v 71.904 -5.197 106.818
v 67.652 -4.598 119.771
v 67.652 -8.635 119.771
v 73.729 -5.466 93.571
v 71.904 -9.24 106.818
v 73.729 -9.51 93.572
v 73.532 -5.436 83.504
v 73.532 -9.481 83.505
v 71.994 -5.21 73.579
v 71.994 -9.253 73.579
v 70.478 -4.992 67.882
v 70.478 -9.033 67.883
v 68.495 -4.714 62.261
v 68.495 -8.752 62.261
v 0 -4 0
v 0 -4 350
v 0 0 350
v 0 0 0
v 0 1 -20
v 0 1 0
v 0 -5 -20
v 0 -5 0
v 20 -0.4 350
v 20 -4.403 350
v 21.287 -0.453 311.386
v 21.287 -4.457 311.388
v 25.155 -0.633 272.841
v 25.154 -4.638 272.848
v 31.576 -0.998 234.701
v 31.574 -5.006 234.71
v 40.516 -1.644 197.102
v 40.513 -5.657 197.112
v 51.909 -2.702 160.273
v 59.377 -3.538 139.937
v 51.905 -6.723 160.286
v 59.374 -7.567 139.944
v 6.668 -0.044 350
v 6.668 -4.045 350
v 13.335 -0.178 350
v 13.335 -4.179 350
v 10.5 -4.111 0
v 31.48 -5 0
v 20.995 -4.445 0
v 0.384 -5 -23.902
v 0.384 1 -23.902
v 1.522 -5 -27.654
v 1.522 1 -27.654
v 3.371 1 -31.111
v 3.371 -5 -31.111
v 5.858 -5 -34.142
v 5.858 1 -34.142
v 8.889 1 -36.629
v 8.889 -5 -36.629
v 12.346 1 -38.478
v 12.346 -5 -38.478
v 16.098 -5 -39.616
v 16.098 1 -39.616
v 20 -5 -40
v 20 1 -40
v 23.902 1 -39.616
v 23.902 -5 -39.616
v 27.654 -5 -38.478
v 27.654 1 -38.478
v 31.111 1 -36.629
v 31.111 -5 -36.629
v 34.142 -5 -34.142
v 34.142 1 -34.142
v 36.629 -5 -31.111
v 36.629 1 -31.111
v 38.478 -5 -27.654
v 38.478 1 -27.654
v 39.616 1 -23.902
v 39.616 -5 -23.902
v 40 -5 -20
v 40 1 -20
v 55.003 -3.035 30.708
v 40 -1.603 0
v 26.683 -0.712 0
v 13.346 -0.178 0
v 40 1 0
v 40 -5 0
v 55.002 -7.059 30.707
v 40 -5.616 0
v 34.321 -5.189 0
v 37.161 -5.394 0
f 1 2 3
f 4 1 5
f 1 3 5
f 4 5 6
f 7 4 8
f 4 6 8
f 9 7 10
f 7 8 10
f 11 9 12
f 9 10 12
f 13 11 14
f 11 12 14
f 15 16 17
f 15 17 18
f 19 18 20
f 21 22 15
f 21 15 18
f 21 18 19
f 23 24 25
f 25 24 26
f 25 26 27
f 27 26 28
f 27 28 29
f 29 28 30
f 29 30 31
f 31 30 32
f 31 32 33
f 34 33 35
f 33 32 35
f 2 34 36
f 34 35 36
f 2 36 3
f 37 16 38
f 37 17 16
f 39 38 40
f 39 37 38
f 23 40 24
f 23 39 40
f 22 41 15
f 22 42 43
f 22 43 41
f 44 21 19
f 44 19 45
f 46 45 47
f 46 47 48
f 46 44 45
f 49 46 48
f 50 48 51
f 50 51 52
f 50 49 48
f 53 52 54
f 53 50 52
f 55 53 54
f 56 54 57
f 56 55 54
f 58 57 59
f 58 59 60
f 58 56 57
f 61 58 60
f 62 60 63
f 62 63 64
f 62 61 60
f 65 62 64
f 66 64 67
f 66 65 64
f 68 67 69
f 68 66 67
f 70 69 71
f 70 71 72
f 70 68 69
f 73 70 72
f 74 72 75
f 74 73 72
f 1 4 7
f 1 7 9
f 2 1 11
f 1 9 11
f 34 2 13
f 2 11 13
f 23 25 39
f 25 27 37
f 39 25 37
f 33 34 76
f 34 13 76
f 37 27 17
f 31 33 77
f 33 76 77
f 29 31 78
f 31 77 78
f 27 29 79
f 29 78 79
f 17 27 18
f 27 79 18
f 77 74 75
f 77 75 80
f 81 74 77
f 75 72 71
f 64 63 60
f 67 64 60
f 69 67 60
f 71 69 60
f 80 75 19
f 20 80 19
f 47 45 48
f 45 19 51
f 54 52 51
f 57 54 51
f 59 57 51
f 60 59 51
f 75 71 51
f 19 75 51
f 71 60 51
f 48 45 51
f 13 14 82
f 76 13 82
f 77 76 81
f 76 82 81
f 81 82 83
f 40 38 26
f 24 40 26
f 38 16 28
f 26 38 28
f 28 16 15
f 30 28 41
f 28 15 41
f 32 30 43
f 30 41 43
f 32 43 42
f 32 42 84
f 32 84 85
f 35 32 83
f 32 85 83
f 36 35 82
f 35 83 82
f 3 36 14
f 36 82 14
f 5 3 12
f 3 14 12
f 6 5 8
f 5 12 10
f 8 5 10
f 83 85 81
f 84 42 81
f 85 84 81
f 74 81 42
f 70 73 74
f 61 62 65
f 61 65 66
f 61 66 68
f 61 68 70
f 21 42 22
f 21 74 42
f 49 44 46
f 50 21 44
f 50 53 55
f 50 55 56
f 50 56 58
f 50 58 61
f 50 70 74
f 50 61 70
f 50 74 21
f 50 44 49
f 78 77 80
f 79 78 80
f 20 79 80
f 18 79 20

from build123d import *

# Parameters (mm, degrees)
EXTRUDE_1_DEPTH          = 350
EXTRUDE_2_DEPTH          = 1
EXTRUDE_2_DEPTH_BACK     = 5
CUT_EXTRUDE_1_DEPTH      = 360.210404844
CUT_EXTRUDE_1_DEPTH_BACK = 360.210404844
SKETCH_4_OUTSIDE_W       = 161.658
SKETCH_4_OUTSIDE_H       = 471.658


with BuildPart() as part:
    # 草图2 → 凸台-拉伸1 (new body)
    with BuildSketch(Plane.XY):
        with BuildLine():
            Line((80, -10.494126695), (80, -6.44149283))
            ThreePointArc((80, -6.44149283), (40.129455609, -1.612974895), (0, 0))
            Line((0, 0), (0, -4))
            ThreePointArc((0, -4), (40.131576351, -5.626197519), (80, -10.494126695))
        make_face()
    extrude(amount=EXTRUDE_1_DEPTH)

    # 草图3 → 凸台-拉伸2 (add, two sides: drawn at the far end of the back side and taken through both)
    with BuildSketch(Plane(origin=(0, 0, 0), x_dir=(1, 0, 0), z_dir=(0, 1, 0)).offset(-EXTRUDE_2_DEPTH_BACK)):
        with BuildLine():
            Line((0, 0), (0, 20))
            ThreePointArc((0, 20), (20, 40), (40, 20))
            Line((40, 20), (40, 0))
            Line((40, 0), (0, 0))
        make_face()
    extrude(amount=EXTRUDE_2_DEPTH + EXTRUDE_2_DEPTH_BACK)

    # 草图4 outside → 切除-拉伸1 (cut, two sides: drawn at the far end of the back side and taken through both)
    with BuildSketch(Plane(origin=(0, 1, 0), x_dir=(1, 0, 0), z_dir=(0, 1, 0)).offset(-CUT_EXTRUDE_1_DEPTH_BACK)):
        with Locations((40, -155)):
            Rectangle(SKETCH_4_OUTSIDE_W, SKETCH_4_OUTSIDE_H)
        with BuildLine():
            Line((0, -350), (20, -350))
            ThreePointArc((20, -350), (32.037873221, -232.445661311), (67.651801878, -119.770992366))
            ThreePointArc((67.651801878, -119.770992366), (73.805604709, -91.100068227), (68.49542517, -62.260977161))
            ThreePointArc((68.49542517, -62.260977161), (55.031874412, -30.771595648), (40, 0))
            Line((40, 0), (40, 103.702750203))
            Line((40, 103.702750203), (-64.531778678, 103.702750203))
            Line((-64.531778678, 103.702750203), (-64.531778678, -350))
            Line((-64.531778678, -350), (0, -350))
        make_face(mode=Mode.SUBTRACT)
    extrude(amount=CUT_EXTRUDE_1_DEPTH + CUT_EXTRUDE_1_DEPTH_BACK, mode=Mode.SUBTRACT)


solid = part.part
